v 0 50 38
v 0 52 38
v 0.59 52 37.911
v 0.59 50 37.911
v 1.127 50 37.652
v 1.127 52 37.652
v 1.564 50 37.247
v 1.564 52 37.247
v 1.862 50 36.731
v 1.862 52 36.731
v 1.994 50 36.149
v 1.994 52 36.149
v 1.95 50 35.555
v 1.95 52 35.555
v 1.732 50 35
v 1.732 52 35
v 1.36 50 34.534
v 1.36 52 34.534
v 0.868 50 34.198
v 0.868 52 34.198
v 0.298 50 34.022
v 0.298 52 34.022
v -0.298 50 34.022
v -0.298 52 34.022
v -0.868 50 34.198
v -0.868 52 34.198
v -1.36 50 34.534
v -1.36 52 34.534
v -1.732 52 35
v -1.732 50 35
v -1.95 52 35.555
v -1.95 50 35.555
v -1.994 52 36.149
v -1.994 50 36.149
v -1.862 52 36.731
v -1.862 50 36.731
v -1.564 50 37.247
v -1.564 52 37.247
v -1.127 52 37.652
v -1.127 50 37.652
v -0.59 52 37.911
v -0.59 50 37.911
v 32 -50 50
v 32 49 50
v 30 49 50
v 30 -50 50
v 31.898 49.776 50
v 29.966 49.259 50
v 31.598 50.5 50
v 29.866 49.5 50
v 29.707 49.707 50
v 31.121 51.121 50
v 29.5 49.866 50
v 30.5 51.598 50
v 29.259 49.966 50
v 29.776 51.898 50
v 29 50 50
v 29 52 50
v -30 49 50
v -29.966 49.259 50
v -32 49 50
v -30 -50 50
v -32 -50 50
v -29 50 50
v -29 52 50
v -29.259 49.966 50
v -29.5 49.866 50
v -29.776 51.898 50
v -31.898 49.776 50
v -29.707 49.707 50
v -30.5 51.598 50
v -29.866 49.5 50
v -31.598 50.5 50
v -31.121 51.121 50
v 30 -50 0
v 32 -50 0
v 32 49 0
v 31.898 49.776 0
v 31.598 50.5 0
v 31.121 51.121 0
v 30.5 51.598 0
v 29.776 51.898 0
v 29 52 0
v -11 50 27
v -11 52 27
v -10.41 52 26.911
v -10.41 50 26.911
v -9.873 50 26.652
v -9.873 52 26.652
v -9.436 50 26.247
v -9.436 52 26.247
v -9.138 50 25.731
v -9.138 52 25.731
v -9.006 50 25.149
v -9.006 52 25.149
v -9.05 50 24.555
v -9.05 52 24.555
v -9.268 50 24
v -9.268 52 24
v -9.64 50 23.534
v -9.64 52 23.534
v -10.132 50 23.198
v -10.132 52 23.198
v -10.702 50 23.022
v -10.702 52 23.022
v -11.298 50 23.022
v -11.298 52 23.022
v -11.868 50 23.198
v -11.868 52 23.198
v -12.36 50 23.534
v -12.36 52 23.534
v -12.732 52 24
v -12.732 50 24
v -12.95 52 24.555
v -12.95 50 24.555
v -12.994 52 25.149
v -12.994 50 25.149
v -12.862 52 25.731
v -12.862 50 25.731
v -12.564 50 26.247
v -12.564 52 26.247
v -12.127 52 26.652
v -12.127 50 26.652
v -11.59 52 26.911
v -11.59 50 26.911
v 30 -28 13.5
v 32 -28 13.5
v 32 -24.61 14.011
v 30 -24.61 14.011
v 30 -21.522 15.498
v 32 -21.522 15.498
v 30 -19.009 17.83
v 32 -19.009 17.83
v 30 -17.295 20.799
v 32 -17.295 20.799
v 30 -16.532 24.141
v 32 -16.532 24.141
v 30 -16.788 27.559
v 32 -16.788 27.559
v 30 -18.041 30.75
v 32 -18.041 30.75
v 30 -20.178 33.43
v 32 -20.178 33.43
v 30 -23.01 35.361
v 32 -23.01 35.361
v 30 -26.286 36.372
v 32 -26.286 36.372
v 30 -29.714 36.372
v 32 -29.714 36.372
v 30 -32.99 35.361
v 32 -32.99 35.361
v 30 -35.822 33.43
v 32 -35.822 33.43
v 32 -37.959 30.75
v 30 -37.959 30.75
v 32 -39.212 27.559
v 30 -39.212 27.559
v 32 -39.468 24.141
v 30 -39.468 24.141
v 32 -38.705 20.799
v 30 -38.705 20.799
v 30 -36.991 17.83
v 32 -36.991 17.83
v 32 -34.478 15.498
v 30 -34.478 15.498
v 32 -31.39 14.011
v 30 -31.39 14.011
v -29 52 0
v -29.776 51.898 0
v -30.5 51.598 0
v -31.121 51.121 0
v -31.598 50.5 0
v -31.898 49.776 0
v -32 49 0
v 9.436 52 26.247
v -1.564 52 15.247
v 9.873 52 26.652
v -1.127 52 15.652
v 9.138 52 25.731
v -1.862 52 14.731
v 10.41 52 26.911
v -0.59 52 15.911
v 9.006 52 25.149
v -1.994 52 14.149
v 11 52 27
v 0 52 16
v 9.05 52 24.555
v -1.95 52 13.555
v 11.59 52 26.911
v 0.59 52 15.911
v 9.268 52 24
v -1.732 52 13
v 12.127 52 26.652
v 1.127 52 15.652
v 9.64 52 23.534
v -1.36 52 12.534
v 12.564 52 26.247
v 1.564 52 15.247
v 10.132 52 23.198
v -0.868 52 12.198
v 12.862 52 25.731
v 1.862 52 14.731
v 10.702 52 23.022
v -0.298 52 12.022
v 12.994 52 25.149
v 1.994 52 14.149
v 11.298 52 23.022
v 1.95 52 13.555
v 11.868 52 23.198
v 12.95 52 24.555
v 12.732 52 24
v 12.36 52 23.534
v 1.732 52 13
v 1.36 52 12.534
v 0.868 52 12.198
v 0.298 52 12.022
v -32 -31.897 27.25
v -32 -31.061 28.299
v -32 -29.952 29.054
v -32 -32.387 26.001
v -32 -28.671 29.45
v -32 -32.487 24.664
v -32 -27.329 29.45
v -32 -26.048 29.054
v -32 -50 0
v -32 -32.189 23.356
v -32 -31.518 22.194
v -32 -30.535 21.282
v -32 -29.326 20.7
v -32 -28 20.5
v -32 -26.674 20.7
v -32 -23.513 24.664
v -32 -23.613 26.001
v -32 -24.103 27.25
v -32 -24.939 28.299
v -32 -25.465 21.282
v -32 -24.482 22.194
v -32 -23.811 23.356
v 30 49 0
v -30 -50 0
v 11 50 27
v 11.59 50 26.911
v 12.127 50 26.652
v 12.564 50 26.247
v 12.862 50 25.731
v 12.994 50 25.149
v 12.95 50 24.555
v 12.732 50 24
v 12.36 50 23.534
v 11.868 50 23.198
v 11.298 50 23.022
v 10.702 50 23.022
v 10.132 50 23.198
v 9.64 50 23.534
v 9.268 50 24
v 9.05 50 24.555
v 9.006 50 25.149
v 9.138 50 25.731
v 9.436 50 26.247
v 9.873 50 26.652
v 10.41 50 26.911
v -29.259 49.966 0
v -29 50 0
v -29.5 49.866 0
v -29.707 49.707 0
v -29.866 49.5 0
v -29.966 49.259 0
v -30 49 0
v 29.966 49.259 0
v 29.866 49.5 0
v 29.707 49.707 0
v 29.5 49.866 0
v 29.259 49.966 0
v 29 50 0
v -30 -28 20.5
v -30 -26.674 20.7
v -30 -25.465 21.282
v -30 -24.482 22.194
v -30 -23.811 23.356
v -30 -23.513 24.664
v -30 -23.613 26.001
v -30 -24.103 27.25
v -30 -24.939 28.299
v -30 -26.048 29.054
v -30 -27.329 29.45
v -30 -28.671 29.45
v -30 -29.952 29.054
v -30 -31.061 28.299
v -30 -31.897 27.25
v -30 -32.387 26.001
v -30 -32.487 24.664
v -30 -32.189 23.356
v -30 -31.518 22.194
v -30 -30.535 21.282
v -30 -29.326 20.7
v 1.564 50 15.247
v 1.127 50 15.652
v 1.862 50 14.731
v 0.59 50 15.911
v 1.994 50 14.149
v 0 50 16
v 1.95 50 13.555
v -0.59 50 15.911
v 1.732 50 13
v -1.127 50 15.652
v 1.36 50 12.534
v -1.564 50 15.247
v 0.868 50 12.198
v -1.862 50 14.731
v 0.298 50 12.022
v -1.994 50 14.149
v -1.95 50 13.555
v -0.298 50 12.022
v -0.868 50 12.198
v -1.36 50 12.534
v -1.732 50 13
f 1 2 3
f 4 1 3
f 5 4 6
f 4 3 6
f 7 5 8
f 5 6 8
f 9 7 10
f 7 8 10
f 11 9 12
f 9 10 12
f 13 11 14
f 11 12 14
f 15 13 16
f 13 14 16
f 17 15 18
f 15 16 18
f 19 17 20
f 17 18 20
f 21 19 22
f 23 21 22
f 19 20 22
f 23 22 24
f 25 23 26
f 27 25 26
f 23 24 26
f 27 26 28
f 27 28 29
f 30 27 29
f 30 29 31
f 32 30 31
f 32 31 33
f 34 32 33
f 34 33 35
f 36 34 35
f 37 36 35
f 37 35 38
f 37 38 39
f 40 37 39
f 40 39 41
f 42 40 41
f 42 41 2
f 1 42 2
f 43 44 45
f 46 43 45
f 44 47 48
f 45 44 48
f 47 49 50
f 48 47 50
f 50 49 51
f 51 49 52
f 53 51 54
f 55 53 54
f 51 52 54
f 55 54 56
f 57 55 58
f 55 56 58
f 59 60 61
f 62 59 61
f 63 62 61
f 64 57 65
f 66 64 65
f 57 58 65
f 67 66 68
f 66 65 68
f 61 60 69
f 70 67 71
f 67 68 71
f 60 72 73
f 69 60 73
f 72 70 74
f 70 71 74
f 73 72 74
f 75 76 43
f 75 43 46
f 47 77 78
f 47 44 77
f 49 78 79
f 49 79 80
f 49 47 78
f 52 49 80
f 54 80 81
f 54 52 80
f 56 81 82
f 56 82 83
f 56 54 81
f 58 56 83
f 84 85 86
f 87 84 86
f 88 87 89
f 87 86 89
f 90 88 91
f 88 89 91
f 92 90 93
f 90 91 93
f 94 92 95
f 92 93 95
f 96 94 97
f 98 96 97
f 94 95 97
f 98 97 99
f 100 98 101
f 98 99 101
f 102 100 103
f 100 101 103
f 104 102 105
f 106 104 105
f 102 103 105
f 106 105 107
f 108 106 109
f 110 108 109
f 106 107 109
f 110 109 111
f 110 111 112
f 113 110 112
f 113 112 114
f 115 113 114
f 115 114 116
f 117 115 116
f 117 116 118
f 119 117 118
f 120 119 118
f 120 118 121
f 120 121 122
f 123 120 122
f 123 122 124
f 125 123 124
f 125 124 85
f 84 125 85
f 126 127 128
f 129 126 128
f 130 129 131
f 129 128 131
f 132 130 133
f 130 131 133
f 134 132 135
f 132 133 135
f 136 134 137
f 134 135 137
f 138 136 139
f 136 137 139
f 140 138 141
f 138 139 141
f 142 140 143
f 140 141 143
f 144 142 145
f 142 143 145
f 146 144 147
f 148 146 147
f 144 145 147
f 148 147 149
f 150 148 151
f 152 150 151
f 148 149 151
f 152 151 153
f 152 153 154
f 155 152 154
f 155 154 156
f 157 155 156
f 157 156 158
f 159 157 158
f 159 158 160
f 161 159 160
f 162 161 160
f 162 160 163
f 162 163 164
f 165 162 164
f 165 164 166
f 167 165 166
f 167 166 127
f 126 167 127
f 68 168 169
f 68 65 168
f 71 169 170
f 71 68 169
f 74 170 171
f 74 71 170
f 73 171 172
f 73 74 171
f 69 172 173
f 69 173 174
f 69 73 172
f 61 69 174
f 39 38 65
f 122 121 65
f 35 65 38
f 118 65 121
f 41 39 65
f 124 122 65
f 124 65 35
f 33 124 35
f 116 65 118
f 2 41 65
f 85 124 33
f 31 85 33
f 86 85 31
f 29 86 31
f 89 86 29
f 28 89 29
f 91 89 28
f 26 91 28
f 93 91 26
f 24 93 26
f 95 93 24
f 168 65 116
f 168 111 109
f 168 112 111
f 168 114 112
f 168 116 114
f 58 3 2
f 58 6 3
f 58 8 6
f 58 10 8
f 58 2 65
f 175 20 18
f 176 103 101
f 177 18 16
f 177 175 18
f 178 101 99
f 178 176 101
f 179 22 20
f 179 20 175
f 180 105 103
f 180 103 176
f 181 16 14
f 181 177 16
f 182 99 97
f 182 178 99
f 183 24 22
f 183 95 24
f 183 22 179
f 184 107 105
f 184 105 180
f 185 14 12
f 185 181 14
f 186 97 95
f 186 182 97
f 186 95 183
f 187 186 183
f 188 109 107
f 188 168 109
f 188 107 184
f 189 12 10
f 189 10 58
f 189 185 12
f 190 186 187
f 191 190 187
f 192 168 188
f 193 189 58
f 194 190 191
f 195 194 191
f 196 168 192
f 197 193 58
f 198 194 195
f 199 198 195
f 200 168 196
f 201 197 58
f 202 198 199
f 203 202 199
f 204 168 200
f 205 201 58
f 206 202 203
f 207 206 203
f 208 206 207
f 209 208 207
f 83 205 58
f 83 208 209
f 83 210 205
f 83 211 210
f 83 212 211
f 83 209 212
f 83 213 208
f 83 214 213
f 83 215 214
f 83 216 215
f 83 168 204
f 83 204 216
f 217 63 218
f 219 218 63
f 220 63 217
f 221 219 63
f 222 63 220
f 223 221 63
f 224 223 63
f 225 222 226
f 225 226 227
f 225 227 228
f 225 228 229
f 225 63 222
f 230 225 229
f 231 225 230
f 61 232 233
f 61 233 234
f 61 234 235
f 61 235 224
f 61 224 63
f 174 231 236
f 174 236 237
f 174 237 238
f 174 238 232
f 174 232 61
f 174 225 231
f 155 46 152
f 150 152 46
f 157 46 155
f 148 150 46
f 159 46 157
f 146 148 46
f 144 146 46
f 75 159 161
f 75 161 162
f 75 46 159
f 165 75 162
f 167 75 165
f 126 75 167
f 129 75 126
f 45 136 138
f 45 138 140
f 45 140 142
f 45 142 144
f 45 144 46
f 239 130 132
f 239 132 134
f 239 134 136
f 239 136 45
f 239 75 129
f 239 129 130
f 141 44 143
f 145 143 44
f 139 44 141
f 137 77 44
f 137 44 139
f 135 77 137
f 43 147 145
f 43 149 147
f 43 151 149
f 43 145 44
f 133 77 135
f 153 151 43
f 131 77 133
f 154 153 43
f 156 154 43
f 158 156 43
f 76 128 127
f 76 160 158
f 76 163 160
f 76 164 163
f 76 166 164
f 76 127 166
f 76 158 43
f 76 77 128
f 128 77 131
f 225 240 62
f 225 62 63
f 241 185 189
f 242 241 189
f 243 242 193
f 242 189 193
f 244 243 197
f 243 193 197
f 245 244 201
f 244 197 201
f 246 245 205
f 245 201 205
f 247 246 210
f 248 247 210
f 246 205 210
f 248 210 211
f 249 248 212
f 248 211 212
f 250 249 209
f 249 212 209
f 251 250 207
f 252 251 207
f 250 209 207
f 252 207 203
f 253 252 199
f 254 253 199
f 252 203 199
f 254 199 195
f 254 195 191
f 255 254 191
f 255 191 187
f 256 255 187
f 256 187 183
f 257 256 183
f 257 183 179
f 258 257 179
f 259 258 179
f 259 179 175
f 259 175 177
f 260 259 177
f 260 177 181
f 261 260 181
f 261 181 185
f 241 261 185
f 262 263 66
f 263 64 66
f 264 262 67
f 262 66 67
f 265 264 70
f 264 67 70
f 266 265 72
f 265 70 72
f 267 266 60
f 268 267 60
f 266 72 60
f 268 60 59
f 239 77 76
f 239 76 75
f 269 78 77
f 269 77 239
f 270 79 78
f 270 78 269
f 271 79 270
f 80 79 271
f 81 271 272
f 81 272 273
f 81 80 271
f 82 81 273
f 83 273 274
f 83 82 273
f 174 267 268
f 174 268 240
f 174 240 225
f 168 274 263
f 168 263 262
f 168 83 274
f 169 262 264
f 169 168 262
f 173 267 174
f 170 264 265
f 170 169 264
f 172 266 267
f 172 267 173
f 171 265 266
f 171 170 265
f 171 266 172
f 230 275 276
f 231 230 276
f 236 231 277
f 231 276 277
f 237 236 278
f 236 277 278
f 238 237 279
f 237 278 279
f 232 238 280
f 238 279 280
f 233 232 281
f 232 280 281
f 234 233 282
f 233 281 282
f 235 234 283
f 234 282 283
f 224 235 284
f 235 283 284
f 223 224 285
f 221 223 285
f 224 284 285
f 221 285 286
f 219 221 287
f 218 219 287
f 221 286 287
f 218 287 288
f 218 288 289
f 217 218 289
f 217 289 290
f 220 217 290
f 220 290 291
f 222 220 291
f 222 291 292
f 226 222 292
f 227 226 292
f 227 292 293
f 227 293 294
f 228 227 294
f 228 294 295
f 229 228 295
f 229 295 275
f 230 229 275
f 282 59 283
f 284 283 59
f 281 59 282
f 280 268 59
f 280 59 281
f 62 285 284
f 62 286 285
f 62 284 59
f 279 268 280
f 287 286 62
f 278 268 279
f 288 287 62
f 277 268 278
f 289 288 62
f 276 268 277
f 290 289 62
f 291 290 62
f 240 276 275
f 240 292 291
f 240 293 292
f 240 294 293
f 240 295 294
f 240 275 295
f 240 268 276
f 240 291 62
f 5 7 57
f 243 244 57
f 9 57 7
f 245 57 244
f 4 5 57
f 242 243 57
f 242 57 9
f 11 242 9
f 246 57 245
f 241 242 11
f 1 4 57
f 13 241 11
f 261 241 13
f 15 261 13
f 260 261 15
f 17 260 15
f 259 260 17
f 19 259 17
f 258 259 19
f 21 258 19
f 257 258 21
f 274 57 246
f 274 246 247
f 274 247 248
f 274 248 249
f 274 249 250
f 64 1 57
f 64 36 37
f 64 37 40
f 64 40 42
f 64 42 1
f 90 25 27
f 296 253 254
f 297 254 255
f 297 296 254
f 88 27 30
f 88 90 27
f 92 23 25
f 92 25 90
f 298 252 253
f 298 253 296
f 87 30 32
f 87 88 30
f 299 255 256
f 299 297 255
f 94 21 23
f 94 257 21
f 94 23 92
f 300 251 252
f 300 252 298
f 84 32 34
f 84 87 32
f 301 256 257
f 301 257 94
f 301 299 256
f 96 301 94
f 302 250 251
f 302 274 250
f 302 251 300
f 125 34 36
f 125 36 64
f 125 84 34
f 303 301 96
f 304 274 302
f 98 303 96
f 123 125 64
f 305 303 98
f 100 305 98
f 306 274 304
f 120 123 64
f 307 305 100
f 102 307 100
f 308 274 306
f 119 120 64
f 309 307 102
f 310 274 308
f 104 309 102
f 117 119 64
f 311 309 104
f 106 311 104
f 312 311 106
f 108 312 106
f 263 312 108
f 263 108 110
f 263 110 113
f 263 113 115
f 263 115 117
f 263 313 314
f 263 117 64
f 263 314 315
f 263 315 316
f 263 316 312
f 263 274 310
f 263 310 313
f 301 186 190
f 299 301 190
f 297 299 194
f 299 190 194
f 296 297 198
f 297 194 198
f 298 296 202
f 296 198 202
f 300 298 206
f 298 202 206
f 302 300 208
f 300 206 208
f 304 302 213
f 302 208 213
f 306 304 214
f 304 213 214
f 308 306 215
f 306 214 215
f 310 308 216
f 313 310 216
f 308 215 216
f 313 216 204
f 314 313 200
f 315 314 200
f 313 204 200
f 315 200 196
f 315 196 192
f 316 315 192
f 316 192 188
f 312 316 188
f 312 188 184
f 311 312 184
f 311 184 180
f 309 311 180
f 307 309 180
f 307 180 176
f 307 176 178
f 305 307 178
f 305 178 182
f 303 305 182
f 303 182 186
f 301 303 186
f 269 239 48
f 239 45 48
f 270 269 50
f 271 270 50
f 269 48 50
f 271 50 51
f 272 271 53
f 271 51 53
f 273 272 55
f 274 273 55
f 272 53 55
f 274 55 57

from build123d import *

# Parameters (mm, degrees)
BOSS_EXTRUDE1_DEPTH = 50
FILLET1_R           = 1
FILLET2_R           = 3
SKETCH2_R           = 2
CUT_EXTRUDE1_DEPTH  = 10
SKETCH4_R           = 11.5
CUT_EXTRUDE3_DEPTH  = 17
SKETCH5_R           = 4.5
CUT_EXTRUDE4_DEPTH  = 3


with BuildPart() as part:
    # Sketch1 → Boss-Extrude1 (new body)
    with BuildSketch(Plane.XY):
        Polygon((-32, -50), (-32, 52), (32, 52), (32, -50), (30, -50), (30, 50), (-30, 50), (-30, -50), align=None)
    extrude(amount=BOSS_EXTRUDE1_DEPTH)

    # Fillet1
    fillet1_edges = [part.edges().sort_by_distance(p)[0] for p in [
        (30, 50, 25),
        (-30, 50, 25),
    ]]
    fillet(fillet1_edges, radius=FILLET1_R)

    # Fillet2
    fillet2_edges = [part.edges().sort_by_distance(p)[0] for p in [
        (-32, 52, 25),
        (32, 52, 25),
    ]]
    fillet(fillet2_edges, radius=FILLET2_R)

    # Sketch2 → Cut-Extrude1 (cut)
    with BuildSketch(Plane(origin=(0, 52, 0), x_dir=(1, 0, 0), z_dir=(0, 1, 0))):
        with Locations(Location((0, -14, 0), (0, 0, 270))):
            Circle(SKETCH2_R)
        with Locations(Location((11, -25, 0), (0, 0, 270))):
            Circle(SKETCH2_R)
        with Locations(Location((0, -36, 0), (0, 0, 270))):
            Circle(SKETCH2_R)
        with Locations(Location((-11, -25, 0), (0, 0, 270))):
            Circle(SKETCH2_R)
    extrude(amount=-CUT_EXTRUDE1_DEPTH, mode=Mode.SUBTRACT)

    # Sketch4 → Cut-Extrude3 (cut)
    with BuildSketch(Plane(origin=(32, 0, 0), x_dir=(0, 0, -1), z_dir=(1, 0, 0))):
        with Locations((-25, -28)):
            Circle(SKETCH4_R)
    extrude(amount=-CUT_EXTRUDE3_DEPTH, mode=Mode.SUBTRACT)

    # Sketch5 → Cut-Extrude4 (cut)
    with BuildSketch(Plane(origin=(-30, 0, 0), x_dir=(0, 0, -1), z_dir=(1, 0, 0))):
        with Locations((-25, -28)):
            Circle(SKETCH5_R)
    extrude(amount=-CUT_EXTRUDE4_DEPTH, mode=Mode.SUBTRACT)


solid = part.part
